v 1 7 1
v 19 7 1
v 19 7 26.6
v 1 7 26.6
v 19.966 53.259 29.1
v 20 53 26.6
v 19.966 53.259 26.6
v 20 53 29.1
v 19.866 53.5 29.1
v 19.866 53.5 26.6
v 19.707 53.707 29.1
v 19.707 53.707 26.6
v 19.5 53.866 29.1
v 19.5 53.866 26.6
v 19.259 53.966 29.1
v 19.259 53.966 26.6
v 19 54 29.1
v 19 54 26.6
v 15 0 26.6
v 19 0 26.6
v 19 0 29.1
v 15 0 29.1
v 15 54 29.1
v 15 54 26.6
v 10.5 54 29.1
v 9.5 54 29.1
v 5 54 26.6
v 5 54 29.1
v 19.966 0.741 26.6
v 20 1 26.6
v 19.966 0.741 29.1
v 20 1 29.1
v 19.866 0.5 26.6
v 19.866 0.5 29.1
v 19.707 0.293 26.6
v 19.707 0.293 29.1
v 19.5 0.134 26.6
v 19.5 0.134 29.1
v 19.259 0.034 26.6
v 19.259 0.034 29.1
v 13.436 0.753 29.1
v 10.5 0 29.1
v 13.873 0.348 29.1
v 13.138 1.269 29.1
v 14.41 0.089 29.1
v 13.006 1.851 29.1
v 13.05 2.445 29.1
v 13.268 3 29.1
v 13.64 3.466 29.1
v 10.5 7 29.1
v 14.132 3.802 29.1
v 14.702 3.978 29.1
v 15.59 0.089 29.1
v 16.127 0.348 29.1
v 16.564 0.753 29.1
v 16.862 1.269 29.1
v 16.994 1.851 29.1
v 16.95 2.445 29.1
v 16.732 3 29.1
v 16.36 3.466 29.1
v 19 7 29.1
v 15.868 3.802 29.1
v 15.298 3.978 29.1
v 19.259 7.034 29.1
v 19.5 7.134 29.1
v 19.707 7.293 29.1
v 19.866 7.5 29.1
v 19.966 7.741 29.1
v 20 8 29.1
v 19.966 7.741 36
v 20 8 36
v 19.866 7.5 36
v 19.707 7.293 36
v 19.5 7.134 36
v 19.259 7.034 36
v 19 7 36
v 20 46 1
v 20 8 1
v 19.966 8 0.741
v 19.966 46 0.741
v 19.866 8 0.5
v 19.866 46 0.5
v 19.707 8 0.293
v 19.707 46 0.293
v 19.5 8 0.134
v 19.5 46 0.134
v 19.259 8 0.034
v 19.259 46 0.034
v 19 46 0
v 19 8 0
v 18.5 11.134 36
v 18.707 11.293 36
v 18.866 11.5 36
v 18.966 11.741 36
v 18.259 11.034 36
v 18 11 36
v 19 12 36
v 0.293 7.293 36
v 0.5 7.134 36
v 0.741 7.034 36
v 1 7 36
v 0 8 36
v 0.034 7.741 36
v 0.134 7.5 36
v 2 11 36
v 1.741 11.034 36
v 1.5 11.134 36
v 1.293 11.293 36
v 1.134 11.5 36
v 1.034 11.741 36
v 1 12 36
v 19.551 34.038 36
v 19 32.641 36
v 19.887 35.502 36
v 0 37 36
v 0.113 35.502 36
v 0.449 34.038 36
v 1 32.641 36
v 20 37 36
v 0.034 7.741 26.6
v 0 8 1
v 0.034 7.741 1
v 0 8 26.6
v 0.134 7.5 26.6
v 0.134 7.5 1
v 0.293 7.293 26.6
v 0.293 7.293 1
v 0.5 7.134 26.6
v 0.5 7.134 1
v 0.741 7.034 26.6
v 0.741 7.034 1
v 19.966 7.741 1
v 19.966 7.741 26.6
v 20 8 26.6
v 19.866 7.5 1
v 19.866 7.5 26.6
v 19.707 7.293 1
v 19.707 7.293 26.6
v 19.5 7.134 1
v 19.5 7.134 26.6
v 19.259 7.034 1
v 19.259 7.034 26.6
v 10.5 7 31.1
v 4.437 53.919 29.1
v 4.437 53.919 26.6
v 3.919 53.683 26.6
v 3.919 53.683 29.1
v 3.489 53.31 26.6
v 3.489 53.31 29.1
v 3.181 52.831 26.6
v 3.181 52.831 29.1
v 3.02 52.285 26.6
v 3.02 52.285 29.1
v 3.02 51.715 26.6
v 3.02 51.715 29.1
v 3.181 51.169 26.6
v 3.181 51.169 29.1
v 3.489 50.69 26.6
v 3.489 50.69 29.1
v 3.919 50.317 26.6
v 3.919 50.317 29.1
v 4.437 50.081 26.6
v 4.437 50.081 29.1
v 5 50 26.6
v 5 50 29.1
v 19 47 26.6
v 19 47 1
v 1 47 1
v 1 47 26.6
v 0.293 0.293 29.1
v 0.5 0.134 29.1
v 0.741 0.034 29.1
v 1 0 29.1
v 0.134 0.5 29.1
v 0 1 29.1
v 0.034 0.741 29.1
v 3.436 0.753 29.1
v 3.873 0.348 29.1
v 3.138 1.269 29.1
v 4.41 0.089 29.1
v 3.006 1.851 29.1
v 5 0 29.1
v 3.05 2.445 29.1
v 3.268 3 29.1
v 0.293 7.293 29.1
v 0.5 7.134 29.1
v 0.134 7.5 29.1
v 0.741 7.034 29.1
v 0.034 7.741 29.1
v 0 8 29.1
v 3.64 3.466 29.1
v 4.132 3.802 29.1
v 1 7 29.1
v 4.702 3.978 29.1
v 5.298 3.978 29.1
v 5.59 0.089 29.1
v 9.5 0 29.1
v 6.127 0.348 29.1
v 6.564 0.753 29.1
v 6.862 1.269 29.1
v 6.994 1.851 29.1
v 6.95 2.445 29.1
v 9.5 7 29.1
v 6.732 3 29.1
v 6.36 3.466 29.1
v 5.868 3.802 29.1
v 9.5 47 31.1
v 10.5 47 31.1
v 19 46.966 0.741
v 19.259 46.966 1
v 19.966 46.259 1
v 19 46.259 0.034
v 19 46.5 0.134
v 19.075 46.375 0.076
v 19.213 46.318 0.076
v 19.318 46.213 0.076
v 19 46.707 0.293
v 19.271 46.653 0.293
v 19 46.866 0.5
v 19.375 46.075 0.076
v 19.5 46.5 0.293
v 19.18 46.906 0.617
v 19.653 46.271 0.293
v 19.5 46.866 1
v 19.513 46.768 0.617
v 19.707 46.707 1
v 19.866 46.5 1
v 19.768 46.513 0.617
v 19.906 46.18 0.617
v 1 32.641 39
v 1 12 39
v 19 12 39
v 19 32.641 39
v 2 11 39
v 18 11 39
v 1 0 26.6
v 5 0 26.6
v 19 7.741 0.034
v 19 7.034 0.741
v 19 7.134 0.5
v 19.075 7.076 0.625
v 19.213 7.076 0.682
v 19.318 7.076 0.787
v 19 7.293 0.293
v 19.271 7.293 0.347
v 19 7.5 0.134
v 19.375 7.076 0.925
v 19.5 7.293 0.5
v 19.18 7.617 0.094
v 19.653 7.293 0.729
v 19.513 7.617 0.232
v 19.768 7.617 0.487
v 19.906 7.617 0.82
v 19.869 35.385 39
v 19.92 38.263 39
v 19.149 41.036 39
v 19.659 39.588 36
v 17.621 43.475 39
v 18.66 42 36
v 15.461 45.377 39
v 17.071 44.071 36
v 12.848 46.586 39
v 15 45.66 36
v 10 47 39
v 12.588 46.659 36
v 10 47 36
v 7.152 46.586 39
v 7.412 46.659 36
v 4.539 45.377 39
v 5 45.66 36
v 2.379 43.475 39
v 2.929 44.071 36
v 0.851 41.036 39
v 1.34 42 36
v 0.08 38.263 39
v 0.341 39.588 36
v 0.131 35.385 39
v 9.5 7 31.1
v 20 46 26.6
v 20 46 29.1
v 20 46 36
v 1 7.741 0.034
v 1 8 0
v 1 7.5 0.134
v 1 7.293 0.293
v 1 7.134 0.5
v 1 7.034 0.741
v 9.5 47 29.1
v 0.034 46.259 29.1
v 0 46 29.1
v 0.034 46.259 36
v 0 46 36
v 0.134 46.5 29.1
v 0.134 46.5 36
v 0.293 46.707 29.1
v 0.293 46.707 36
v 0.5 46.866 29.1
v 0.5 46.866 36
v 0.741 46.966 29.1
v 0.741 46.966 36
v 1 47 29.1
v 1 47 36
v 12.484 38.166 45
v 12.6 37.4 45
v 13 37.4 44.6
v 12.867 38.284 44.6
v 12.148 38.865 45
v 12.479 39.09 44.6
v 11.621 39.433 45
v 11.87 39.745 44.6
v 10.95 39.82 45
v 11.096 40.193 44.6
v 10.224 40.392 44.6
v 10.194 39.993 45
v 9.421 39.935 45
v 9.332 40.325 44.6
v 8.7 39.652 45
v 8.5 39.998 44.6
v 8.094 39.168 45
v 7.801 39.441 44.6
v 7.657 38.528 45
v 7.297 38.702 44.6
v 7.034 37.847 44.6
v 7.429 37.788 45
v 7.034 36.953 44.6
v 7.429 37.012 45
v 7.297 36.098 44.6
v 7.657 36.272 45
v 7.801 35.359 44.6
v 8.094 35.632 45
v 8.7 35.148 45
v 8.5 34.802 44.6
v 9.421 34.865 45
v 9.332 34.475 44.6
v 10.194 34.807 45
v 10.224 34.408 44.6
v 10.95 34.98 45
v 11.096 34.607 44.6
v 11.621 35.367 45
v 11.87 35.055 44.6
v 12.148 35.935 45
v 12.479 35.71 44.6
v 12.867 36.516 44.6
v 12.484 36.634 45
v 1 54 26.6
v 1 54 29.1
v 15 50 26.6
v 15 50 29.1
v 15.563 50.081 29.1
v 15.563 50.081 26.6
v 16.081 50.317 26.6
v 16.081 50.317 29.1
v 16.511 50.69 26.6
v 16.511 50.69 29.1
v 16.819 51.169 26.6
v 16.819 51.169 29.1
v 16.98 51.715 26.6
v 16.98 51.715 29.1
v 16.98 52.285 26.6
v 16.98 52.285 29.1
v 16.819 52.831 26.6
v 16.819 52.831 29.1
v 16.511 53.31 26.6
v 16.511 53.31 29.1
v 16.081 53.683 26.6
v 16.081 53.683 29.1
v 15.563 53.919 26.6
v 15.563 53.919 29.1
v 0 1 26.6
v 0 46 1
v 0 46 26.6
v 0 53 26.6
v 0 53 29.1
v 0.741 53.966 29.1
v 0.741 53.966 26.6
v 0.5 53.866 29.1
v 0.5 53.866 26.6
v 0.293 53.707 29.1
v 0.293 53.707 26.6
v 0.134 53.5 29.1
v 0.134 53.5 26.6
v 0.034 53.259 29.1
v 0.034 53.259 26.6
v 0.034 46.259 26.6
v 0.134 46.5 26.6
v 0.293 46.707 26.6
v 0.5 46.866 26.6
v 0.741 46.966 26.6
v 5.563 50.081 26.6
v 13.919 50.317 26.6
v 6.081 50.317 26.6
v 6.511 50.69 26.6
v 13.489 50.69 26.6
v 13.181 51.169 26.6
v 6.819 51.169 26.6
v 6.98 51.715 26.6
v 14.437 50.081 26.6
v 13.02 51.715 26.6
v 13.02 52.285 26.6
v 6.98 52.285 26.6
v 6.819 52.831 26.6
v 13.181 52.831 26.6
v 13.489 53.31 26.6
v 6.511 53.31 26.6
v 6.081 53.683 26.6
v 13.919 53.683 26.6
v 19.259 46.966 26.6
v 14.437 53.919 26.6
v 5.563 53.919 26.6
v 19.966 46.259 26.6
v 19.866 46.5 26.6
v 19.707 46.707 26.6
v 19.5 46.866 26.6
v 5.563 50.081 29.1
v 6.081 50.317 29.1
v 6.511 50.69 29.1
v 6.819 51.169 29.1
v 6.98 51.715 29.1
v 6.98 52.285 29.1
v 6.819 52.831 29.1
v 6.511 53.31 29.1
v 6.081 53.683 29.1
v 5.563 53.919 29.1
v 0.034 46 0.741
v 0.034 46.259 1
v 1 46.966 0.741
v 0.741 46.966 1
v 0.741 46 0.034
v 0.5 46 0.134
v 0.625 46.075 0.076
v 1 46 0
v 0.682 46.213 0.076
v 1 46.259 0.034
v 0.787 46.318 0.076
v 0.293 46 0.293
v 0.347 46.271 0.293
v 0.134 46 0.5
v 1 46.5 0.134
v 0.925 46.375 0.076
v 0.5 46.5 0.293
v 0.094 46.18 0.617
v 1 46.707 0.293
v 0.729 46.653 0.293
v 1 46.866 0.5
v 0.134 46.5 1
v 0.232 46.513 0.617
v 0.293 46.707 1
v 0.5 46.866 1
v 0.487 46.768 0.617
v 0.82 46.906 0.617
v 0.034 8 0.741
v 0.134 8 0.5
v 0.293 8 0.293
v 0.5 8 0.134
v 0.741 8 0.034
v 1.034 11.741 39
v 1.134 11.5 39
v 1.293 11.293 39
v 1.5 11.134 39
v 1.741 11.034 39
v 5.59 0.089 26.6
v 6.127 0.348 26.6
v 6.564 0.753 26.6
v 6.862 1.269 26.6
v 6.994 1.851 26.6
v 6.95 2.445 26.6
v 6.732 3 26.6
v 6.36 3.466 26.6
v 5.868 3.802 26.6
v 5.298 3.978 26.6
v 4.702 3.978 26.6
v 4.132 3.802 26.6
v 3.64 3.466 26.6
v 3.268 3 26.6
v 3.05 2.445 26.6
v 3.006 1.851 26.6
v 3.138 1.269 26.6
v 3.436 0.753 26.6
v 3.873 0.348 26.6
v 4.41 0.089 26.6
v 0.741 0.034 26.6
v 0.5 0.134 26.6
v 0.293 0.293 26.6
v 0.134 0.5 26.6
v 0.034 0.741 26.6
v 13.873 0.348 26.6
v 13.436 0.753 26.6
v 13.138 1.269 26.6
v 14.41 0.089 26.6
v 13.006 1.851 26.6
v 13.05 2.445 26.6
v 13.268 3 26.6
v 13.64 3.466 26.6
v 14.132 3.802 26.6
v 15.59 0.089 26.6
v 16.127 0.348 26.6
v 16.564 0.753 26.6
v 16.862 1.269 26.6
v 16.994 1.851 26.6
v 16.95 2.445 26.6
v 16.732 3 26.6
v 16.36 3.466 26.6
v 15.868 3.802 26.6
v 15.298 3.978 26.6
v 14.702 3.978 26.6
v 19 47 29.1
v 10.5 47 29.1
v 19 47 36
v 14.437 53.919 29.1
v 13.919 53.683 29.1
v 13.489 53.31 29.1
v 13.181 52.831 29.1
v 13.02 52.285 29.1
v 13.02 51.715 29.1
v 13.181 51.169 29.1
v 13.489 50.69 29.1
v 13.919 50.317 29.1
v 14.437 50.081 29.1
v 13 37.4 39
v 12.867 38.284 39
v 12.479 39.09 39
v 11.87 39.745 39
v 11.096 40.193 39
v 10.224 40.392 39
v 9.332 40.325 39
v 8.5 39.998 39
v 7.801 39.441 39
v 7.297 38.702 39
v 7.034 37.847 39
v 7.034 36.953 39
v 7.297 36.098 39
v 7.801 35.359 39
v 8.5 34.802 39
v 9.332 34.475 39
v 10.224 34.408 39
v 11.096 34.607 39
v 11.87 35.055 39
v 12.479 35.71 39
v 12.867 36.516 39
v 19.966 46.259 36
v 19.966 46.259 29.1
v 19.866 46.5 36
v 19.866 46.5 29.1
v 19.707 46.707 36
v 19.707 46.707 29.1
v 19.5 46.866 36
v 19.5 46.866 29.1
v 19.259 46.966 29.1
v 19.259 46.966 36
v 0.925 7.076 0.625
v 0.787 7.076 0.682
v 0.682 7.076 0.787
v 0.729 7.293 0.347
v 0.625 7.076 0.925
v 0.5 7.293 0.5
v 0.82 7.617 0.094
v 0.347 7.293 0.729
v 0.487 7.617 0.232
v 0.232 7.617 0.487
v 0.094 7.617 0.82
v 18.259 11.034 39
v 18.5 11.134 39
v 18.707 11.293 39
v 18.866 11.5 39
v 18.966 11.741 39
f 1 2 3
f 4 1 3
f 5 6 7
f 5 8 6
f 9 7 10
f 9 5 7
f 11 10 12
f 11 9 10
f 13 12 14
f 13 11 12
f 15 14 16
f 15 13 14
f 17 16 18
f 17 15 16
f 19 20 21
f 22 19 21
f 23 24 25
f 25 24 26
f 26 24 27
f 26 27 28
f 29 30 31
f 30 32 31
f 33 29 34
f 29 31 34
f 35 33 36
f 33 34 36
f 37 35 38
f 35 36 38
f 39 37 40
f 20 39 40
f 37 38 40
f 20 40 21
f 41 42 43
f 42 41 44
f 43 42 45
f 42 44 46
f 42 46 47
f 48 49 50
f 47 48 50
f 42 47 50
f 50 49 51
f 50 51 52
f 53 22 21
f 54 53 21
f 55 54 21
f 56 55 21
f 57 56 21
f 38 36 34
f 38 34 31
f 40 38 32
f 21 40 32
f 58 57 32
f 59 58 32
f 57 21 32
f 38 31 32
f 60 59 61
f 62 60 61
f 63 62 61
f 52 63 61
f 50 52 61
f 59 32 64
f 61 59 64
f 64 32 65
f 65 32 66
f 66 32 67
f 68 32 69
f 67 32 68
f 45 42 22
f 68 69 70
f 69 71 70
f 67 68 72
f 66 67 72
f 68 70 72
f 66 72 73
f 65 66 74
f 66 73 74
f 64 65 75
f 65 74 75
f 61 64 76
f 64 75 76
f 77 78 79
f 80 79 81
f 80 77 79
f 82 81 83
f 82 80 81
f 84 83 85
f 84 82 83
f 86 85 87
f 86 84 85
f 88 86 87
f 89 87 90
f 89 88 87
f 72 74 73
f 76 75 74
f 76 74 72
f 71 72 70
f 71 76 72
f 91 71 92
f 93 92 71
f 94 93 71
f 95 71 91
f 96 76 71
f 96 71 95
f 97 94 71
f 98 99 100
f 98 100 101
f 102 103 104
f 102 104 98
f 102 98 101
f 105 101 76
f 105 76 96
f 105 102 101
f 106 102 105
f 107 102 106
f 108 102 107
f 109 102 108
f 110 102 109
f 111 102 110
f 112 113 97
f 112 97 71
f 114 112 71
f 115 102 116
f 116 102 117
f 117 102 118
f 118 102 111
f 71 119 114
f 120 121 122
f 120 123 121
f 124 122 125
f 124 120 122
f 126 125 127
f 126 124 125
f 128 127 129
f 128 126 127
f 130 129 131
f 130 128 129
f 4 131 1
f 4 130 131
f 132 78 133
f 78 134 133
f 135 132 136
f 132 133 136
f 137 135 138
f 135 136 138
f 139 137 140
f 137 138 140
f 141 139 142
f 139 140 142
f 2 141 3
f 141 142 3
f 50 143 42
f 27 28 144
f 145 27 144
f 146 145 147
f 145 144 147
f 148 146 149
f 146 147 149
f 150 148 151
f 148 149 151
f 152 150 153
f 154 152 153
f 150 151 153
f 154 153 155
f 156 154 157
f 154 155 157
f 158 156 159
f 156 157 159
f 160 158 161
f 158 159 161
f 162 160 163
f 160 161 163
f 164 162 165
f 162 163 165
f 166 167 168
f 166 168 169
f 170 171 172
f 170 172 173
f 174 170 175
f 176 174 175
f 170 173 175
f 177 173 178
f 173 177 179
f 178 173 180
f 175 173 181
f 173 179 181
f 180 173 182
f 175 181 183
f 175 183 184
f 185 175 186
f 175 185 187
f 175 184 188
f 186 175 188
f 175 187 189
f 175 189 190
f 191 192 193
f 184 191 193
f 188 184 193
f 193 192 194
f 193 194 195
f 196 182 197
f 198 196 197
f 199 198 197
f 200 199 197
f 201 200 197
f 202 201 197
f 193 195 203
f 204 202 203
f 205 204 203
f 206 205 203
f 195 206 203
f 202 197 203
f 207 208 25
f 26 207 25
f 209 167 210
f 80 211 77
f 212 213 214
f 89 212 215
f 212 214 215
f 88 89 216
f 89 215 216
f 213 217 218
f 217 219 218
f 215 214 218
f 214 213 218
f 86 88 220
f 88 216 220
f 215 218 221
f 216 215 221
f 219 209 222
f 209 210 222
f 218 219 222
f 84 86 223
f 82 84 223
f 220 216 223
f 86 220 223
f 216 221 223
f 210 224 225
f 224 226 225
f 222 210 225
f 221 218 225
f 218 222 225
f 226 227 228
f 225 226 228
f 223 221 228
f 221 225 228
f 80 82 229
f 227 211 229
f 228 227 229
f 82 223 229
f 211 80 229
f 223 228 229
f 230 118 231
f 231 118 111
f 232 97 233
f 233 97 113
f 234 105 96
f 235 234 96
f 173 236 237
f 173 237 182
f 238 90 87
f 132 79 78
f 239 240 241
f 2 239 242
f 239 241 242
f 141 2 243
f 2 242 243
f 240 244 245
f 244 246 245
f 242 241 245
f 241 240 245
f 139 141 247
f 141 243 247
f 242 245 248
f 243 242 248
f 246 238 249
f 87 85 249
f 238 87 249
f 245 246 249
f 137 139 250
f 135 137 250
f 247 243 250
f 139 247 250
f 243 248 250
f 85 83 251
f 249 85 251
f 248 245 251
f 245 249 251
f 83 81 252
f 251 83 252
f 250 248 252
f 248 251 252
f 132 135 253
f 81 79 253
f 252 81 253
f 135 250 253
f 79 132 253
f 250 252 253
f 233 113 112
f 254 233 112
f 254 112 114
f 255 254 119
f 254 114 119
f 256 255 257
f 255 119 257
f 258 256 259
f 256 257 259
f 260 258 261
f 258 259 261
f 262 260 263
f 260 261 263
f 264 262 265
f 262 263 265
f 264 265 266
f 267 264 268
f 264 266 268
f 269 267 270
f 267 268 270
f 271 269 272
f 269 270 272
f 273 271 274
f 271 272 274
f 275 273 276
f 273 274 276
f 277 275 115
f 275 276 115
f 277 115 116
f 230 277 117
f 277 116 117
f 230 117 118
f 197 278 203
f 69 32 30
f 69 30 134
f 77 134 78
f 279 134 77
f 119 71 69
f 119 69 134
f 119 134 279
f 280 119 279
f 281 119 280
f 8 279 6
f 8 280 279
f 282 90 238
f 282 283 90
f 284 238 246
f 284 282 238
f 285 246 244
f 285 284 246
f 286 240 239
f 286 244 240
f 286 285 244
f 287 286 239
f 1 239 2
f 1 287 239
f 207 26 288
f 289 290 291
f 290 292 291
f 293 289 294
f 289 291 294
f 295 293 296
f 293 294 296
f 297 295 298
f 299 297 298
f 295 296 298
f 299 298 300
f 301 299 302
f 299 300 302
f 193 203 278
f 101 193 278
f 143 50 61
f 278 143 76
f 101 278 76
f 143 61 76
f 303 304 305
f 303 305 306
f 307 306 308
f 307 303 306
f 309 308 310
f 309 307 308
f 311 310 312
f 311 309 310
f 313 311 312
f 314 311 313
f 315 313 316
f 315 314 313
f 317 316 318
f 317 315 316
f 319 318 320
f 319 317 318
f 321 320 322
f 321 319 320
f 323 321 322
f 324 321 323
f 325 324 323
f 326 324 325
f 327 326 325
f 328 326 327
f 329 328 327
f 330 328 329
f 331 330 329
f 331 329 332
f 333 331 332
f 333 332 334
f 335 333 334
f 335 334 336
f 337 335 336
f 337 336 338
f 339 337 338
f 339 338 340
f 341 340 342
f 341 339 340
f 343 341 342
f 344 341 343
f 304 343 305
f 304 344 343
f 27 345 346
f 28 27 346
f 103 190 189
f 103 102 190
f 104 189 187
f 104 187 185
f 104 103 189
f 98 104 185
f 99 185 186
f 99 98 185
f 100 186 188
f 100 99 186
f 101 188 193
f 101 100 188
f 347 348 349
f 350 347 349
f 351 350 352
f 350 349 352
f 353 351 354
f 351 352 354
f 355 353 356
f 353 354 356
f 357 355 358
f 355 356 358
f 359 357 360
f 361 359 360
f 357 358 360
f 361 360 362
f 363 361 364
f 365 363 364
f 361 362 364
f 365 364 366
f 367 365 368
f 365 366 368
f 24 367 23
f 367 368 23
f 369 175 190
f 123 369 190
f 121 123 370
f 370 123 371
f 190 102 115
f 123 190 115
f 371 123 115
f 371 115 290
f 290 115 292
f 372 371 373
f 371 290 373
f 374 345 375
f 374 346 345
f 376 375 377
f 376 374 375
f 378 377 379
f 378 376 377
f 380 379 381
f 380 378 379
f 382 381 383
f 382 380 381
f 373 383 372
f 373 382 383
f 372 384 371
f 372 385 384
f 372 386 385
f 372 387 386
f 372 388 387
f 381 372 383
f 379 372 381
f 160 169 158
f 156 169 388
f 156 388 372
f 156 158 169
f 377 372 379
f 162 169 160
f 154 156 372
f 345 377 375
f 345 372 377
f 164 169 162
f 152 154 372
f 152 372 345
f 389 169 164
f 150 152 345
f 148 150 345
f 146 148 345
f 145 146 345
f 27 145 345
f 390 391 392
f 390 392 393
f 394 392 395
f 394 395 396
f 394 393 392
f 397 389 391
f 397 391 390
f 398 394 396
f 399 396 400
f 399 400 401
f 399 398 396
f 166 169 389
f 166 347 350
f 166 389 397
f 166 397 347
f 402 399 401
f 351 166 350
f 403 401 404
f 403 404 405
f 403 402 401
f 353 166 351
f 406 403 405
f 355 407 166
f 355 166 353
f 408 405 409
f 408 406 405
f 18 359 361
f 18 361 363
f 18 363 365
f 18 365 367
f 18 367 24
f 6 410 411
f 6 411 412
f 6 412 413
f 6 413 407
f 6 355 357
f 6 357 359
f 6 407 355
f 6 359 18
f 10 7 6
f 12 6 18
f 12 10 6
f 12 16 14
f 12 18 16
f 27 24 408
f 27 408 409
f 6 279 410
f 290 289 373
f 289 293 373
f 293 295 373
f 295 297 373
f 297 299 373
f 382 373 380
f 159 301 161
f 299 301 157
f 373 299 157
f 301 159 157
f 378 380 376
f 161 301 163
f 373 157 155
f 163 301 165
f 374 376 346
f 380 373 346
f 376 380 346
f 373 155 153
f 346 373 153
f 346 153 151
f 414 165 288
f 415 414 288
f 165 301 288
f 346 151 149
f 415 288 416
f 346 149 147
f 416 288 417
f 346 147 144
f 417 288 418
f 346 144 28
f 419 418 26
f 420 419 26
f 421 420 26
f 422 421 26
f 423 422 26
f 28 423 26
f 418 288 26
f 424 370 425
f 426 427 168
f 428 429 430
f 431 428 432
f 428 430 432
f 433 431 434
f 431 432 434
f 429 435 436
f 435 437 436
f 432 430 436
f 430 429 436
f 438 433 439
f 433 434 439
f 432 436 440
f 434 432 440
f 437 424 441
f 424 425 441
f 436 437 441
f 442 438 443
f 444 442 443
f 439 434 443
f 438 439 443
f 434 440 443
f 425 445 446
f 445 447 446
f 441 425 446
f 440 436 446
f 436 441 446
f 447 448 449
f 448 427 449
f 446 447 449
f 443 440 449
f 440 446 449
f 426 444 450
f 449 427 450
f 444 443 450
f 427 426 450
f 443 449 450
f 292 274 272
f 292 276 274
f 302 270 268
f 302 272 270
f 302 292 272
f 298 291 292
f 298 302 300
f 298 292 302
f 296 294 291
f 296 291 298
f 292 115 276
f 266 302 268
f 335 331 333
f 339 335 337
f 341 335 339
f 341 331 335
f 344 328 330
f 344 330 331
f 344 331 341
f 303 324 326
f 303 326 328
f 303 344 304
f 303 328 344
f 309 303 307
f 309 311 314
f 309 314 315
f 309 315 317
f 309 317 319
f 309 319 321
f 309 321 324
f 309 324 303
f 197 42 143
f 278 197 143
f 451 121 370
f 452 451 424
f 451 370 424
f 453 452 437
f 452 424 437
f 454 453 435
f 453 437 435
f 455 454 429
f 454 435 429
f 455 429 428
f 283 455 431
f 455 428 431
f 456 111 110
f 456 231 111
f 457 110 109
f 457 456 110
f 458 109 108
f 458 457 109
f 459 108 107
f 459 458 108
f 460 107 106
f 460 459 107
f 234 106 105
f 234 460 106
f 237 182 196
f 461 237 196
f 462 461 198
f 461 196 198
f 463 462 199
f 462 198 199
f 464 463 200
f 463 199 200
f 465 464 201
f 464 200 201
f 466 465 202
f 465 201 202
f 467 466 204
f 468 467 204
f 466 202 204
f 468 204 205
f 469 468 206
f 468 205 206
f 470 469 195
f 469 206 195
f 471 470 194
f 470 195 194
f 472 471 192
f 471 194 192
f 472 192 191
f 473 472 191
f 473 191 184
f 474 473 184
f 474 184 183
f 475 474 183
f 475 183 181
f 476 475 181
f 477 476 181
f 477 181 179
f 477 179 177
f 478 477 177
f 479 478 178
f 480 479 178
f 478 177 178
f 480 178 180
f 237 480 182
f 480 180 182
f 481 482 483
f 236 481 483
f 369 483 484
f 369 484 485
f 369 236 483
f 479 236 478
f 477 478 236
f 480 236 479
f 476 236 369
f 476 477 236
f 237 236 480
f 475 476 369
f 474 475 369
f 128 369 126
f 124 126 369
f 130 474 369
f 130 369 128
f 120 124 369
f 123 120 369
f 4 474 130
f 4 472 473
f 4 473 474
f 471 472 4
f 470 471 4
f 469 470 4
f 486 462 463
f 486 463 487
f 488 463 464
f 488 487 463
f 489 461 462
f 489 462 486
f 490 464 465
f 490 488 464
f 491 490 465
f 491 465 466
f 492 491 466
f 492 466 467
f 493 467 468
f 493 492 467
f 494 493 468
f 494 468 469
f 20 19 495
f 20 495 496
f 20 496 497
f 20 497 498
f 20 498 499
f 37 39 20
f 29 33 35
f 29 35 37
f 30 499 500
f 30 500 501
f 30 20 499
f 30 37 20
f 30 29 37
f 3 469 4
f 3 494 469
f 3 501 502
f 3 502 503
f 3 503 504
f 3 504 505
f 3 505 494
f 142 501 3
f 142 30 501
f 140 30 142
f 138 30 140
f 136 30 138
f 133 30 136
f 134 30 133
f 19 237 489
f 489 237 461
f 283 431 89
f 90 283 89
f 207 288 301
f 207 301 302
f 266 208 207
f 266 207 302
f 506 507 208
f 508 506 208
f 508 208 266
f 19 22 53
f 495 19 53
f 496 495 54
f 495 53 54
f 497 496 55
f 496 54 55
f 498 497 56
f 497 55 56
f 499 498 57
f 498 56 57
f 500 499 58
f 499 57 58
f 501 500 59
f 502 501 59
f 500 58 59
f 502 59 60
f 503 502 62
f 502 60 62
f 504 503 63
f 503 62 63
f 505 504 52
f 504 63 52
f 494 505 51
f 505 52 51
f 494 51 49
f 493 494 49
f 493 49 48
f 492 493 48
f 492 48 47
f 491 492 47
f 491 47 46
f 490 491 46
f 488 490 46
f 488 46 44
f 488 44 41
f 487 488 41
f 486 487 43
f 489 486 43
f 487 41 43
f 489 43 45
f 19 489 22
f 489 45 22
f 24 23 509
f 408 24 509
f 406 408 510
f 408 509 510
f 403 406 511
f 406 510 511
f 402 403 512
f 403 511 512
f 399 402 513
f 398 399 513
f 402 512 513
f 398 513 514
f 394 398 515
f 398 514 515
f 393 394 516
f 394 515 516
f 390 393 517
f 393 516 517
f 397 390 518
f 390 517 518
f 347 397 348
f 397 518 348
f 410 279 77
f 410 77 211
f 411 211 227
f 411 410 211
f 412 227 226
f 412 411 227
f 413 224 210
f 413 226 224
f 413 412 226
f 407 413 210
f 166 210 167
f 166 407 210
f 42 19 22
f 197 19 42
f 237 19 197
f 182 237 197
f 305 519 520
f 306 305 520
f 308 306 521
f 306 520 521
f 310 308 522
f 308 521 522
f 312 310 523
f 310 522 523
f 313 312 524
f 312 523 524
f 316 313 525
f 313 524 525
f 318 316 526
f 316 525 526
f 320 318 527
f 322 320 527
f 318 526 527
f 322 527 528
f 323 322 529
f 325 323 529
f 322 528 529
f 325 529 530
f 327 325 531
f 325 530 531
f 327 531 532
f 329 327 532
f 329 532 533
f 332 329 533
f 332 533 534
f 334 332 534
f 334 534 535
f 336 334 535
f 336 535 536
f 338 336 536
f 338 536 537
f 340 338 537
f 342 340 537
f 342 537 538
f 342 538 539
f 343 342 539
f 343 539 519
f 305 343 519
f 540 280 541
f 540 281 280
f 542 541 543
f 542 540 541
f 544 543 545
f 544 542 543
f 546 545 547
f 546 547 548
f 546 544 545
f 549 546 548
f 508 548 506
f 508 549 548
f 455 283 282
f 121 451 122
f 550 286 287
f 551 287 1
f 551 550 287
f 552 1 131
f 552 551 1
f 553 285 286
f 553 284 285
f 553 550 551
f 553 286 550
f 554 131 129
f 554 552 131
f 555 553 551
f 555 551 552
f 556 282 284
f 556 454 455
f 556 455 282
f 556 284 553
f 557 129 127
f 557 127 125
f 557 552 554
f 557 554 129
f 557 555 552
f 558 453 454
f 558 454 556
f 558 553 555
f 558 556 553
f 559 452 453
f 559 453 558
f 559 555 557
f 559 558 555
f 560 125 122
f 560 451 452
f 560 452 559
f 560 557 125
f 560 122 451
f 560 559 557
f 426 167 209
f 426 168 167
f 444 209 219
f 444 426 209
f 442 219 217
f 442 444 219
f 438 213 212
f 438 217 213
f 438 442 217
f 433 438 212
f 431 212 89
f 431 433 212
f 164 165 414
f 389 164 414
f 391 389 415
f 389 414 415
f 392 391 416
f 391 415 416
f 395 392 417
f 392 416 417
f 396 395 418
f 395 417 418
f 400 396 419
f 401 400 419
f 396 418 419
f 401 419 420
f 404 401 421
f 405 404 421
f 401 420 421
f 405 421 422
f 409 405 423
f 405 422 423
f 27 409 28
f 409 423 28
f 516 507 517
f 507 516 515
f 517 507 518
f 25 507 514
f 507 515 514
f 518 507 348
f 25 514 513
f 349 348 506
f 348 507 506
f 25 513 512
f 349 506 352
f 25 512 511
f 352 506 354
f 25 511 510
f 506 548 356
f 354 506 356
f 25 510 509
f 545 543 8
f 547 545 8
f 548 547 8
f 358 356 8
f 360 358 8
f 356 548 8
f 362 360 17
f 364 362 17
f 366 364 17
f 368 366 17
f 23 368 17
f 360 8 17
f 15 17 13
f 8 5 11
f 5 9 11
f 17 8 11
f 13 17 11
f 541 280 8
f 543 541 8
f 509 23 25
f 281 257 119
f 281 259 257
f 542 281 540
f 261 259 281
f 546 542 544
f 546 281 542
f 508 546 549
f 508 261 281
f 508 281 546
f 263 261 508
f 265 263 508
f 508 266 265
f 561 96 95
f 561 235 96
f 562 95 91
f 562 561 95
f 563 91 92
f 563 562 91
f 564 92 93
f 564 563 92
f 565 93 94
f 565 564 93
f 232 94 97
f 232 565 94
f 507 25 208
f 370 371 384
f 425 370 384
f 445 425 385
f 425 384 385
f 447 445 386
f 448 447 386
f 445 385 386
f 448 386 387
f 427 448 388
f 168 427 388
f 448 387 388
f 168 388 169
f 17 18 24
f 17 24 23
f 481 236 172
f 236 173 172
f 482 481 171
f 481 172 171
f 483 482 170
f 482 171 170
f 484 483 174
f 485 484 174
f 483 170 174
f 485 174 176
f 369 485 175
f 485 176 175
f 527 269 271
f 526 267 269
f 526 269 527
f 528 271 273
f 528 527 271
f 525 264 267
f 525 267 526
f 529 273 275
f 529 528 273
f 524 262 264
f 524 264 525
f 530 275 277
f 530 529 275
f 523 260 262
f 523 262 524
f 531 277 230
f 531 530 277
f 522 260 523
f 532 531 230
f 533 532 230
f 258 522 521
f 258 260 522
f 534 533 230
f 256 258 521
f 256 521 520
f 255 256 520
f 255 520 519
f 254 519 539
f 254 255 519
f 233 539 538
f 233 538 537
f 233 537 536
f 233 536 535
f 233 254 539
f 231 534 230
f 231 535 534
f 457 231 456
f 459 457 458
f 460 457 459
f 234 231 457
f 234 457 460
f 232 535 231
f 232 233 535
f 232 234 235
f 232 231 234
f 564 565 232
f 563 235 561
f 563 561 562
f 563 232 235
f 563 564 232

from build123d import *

# Parameters (mm, degrees)
SKETCH_W        = 54
SKETCH_H        = 36
PAD_DEPTH       = 20
SKETCH001_W     = 7
SKETCH001_H     = 26.6
SKETCH001_H_2   = 6.9
POCKET_DEPTH    = 20.001
PAD001_DEPTH    = 3
SKETCH003_R     = 3
PAD002_DEPTH    = 45
SKETCH004_R     = 2
POCKET001_DEPTH = 2.5
PAD003_START    = -9.5
PAD003_DEPTH    = 1
CHAMFER_SIZE    = 0.4
FILLET_R        = 1
FILLET001_R     = 1
FILLET002_R     = 1


with BuildPart() as part:
    # Sketch → Pad (new body)
    with BuildSketch(Plane.YZ):
        with Locations((27, 18)):
            Rectangle(SKETCH_W, SKETCH_H)
    extrude(amount=PAD_DEPTH)

    # Sketch001 (on DatumPlane) → Pocket (cut, through all)
    with BuildSketch(Plane.YZ.offset(20)):
        with Locations((3.5, 13.3)):
            Rectangle(SKETCH001_W, SKETCH001_H)
        with Locations((50.5, 13.3)):
            Rectangle(SKETCH001_W, SKETCH001_H)
        with Locations((3.5, 32.55)):
            Rectangle(SKETCH001_W, SKETCH001_H_2)
        with Locations((50.5, 32.55)):
            Rectangle(SKETCH001_W, SKETCH001_H_2)
    extrude(amount=-POCKET_DEPTH, mode=Mode.SUBTRACT)

    # Sketch002 (on DatumPlane) → Pad001 (join)
    with BuildSketch(Plane(origin=(0, 0, 36), x_dir=(0, -1, 0), z_dir=(0, 0, 1))):
        with BuildLine():
            Line((-11, 19), (-32.641101, 19))
            ThreePointArc((-32.641101, 19), (-47, 10), (-32.641101, 1))
            Line((-32.641101, 1), (-11, 1))
            Line((-11, 1), (-11, 19))
        make_face()
    extrude(amount=PAD001_DEPTH)

    # Sketch003 → Pad002 (join)
    with BuildSketch(Plane.XY):
        with Locations((10, 37.4)):
            Circle(SKETCH003_R)
    extrude(amount=PAD002_DEPTH)

    # Sketch004 (on Face7 of Pad002) → Pocket001 (cut)
    with BuildSketch(Plane(origin=(0, 0, 29.1), x_dir=(0, -1, 0), z_dir=(0, 0, 1))):
        with Locations((-52, 15)):
            Circle(SKETCH004_R)
        with Locations((-52, 5)):
            Circle(SKETCH004_R)
        with Locations((-2, 15)):
            Circle(SKETCH004_R)
        with Locations((-2, 5)):
            Circle(SKETCH004_R)
    extrude(amount=-POCKET001_DEPTH, mode=Mode.SUBTRACT)

    # Sketch005 (on DatumPlane) → Pad003 (join)
    with BuildSketch(Plane.YZ.offset(20).offset(PAD003_START)):
        Polygon((0, 29.1), (7, 31.1), (7, 29.1), align=None)
        Polygon((54, 29.1), (47, 29.1), (47, 31.1), align=None)
    extrude(amount=-PAD003_DEPTH)

    # Chamfer
    chamfer_edges = [part.edges().sort_by_distance(p)[0] for p in [
        (7, 37.4, 45),
    ]]
    chamfer(chamfer_edges, length=CHAMFER_SIZE)

    # Fillet
    fillet_edges = [part.edges().sort_by_distance(p)[0] for p in [
        (0, 47, 13.3),
        (20, 47, 13.3),
        (0, 27, 0),
        (10, 47, 0),
        (20, 27, 0),
        (10, 7, 0),
        (0, 7, 13.3),
        (20, 7, 13.3),
        (20, 7, 32.55),
        (0, 7, 32.55),
        (20, 47, 32.55),
        (0, 47, 32.55),
    ]]
    fillet(fillet_edges, radius=FILLET_R)

    # Fillet001
    fillet001_edges = [part.edges().sort_by_distance(p)[0] for p in [
        (0, 54, 27.85),
        (20, 54, 27.85),
        (0, 0, 27.85),
        (20, 0, 27.85),
    ]]
    fillet(fillet001_edges, radius=FILLET001_R)

    # Fillet002
    fillet002_edges = [part.edges().sort_by_distance(p)[0] for p in [
        (1, 11, 37.5),
        (19, 11, 37.5),
    ]]
    fillet(fillet002_edges, radius=FILLET002_R)


solid = part.part
